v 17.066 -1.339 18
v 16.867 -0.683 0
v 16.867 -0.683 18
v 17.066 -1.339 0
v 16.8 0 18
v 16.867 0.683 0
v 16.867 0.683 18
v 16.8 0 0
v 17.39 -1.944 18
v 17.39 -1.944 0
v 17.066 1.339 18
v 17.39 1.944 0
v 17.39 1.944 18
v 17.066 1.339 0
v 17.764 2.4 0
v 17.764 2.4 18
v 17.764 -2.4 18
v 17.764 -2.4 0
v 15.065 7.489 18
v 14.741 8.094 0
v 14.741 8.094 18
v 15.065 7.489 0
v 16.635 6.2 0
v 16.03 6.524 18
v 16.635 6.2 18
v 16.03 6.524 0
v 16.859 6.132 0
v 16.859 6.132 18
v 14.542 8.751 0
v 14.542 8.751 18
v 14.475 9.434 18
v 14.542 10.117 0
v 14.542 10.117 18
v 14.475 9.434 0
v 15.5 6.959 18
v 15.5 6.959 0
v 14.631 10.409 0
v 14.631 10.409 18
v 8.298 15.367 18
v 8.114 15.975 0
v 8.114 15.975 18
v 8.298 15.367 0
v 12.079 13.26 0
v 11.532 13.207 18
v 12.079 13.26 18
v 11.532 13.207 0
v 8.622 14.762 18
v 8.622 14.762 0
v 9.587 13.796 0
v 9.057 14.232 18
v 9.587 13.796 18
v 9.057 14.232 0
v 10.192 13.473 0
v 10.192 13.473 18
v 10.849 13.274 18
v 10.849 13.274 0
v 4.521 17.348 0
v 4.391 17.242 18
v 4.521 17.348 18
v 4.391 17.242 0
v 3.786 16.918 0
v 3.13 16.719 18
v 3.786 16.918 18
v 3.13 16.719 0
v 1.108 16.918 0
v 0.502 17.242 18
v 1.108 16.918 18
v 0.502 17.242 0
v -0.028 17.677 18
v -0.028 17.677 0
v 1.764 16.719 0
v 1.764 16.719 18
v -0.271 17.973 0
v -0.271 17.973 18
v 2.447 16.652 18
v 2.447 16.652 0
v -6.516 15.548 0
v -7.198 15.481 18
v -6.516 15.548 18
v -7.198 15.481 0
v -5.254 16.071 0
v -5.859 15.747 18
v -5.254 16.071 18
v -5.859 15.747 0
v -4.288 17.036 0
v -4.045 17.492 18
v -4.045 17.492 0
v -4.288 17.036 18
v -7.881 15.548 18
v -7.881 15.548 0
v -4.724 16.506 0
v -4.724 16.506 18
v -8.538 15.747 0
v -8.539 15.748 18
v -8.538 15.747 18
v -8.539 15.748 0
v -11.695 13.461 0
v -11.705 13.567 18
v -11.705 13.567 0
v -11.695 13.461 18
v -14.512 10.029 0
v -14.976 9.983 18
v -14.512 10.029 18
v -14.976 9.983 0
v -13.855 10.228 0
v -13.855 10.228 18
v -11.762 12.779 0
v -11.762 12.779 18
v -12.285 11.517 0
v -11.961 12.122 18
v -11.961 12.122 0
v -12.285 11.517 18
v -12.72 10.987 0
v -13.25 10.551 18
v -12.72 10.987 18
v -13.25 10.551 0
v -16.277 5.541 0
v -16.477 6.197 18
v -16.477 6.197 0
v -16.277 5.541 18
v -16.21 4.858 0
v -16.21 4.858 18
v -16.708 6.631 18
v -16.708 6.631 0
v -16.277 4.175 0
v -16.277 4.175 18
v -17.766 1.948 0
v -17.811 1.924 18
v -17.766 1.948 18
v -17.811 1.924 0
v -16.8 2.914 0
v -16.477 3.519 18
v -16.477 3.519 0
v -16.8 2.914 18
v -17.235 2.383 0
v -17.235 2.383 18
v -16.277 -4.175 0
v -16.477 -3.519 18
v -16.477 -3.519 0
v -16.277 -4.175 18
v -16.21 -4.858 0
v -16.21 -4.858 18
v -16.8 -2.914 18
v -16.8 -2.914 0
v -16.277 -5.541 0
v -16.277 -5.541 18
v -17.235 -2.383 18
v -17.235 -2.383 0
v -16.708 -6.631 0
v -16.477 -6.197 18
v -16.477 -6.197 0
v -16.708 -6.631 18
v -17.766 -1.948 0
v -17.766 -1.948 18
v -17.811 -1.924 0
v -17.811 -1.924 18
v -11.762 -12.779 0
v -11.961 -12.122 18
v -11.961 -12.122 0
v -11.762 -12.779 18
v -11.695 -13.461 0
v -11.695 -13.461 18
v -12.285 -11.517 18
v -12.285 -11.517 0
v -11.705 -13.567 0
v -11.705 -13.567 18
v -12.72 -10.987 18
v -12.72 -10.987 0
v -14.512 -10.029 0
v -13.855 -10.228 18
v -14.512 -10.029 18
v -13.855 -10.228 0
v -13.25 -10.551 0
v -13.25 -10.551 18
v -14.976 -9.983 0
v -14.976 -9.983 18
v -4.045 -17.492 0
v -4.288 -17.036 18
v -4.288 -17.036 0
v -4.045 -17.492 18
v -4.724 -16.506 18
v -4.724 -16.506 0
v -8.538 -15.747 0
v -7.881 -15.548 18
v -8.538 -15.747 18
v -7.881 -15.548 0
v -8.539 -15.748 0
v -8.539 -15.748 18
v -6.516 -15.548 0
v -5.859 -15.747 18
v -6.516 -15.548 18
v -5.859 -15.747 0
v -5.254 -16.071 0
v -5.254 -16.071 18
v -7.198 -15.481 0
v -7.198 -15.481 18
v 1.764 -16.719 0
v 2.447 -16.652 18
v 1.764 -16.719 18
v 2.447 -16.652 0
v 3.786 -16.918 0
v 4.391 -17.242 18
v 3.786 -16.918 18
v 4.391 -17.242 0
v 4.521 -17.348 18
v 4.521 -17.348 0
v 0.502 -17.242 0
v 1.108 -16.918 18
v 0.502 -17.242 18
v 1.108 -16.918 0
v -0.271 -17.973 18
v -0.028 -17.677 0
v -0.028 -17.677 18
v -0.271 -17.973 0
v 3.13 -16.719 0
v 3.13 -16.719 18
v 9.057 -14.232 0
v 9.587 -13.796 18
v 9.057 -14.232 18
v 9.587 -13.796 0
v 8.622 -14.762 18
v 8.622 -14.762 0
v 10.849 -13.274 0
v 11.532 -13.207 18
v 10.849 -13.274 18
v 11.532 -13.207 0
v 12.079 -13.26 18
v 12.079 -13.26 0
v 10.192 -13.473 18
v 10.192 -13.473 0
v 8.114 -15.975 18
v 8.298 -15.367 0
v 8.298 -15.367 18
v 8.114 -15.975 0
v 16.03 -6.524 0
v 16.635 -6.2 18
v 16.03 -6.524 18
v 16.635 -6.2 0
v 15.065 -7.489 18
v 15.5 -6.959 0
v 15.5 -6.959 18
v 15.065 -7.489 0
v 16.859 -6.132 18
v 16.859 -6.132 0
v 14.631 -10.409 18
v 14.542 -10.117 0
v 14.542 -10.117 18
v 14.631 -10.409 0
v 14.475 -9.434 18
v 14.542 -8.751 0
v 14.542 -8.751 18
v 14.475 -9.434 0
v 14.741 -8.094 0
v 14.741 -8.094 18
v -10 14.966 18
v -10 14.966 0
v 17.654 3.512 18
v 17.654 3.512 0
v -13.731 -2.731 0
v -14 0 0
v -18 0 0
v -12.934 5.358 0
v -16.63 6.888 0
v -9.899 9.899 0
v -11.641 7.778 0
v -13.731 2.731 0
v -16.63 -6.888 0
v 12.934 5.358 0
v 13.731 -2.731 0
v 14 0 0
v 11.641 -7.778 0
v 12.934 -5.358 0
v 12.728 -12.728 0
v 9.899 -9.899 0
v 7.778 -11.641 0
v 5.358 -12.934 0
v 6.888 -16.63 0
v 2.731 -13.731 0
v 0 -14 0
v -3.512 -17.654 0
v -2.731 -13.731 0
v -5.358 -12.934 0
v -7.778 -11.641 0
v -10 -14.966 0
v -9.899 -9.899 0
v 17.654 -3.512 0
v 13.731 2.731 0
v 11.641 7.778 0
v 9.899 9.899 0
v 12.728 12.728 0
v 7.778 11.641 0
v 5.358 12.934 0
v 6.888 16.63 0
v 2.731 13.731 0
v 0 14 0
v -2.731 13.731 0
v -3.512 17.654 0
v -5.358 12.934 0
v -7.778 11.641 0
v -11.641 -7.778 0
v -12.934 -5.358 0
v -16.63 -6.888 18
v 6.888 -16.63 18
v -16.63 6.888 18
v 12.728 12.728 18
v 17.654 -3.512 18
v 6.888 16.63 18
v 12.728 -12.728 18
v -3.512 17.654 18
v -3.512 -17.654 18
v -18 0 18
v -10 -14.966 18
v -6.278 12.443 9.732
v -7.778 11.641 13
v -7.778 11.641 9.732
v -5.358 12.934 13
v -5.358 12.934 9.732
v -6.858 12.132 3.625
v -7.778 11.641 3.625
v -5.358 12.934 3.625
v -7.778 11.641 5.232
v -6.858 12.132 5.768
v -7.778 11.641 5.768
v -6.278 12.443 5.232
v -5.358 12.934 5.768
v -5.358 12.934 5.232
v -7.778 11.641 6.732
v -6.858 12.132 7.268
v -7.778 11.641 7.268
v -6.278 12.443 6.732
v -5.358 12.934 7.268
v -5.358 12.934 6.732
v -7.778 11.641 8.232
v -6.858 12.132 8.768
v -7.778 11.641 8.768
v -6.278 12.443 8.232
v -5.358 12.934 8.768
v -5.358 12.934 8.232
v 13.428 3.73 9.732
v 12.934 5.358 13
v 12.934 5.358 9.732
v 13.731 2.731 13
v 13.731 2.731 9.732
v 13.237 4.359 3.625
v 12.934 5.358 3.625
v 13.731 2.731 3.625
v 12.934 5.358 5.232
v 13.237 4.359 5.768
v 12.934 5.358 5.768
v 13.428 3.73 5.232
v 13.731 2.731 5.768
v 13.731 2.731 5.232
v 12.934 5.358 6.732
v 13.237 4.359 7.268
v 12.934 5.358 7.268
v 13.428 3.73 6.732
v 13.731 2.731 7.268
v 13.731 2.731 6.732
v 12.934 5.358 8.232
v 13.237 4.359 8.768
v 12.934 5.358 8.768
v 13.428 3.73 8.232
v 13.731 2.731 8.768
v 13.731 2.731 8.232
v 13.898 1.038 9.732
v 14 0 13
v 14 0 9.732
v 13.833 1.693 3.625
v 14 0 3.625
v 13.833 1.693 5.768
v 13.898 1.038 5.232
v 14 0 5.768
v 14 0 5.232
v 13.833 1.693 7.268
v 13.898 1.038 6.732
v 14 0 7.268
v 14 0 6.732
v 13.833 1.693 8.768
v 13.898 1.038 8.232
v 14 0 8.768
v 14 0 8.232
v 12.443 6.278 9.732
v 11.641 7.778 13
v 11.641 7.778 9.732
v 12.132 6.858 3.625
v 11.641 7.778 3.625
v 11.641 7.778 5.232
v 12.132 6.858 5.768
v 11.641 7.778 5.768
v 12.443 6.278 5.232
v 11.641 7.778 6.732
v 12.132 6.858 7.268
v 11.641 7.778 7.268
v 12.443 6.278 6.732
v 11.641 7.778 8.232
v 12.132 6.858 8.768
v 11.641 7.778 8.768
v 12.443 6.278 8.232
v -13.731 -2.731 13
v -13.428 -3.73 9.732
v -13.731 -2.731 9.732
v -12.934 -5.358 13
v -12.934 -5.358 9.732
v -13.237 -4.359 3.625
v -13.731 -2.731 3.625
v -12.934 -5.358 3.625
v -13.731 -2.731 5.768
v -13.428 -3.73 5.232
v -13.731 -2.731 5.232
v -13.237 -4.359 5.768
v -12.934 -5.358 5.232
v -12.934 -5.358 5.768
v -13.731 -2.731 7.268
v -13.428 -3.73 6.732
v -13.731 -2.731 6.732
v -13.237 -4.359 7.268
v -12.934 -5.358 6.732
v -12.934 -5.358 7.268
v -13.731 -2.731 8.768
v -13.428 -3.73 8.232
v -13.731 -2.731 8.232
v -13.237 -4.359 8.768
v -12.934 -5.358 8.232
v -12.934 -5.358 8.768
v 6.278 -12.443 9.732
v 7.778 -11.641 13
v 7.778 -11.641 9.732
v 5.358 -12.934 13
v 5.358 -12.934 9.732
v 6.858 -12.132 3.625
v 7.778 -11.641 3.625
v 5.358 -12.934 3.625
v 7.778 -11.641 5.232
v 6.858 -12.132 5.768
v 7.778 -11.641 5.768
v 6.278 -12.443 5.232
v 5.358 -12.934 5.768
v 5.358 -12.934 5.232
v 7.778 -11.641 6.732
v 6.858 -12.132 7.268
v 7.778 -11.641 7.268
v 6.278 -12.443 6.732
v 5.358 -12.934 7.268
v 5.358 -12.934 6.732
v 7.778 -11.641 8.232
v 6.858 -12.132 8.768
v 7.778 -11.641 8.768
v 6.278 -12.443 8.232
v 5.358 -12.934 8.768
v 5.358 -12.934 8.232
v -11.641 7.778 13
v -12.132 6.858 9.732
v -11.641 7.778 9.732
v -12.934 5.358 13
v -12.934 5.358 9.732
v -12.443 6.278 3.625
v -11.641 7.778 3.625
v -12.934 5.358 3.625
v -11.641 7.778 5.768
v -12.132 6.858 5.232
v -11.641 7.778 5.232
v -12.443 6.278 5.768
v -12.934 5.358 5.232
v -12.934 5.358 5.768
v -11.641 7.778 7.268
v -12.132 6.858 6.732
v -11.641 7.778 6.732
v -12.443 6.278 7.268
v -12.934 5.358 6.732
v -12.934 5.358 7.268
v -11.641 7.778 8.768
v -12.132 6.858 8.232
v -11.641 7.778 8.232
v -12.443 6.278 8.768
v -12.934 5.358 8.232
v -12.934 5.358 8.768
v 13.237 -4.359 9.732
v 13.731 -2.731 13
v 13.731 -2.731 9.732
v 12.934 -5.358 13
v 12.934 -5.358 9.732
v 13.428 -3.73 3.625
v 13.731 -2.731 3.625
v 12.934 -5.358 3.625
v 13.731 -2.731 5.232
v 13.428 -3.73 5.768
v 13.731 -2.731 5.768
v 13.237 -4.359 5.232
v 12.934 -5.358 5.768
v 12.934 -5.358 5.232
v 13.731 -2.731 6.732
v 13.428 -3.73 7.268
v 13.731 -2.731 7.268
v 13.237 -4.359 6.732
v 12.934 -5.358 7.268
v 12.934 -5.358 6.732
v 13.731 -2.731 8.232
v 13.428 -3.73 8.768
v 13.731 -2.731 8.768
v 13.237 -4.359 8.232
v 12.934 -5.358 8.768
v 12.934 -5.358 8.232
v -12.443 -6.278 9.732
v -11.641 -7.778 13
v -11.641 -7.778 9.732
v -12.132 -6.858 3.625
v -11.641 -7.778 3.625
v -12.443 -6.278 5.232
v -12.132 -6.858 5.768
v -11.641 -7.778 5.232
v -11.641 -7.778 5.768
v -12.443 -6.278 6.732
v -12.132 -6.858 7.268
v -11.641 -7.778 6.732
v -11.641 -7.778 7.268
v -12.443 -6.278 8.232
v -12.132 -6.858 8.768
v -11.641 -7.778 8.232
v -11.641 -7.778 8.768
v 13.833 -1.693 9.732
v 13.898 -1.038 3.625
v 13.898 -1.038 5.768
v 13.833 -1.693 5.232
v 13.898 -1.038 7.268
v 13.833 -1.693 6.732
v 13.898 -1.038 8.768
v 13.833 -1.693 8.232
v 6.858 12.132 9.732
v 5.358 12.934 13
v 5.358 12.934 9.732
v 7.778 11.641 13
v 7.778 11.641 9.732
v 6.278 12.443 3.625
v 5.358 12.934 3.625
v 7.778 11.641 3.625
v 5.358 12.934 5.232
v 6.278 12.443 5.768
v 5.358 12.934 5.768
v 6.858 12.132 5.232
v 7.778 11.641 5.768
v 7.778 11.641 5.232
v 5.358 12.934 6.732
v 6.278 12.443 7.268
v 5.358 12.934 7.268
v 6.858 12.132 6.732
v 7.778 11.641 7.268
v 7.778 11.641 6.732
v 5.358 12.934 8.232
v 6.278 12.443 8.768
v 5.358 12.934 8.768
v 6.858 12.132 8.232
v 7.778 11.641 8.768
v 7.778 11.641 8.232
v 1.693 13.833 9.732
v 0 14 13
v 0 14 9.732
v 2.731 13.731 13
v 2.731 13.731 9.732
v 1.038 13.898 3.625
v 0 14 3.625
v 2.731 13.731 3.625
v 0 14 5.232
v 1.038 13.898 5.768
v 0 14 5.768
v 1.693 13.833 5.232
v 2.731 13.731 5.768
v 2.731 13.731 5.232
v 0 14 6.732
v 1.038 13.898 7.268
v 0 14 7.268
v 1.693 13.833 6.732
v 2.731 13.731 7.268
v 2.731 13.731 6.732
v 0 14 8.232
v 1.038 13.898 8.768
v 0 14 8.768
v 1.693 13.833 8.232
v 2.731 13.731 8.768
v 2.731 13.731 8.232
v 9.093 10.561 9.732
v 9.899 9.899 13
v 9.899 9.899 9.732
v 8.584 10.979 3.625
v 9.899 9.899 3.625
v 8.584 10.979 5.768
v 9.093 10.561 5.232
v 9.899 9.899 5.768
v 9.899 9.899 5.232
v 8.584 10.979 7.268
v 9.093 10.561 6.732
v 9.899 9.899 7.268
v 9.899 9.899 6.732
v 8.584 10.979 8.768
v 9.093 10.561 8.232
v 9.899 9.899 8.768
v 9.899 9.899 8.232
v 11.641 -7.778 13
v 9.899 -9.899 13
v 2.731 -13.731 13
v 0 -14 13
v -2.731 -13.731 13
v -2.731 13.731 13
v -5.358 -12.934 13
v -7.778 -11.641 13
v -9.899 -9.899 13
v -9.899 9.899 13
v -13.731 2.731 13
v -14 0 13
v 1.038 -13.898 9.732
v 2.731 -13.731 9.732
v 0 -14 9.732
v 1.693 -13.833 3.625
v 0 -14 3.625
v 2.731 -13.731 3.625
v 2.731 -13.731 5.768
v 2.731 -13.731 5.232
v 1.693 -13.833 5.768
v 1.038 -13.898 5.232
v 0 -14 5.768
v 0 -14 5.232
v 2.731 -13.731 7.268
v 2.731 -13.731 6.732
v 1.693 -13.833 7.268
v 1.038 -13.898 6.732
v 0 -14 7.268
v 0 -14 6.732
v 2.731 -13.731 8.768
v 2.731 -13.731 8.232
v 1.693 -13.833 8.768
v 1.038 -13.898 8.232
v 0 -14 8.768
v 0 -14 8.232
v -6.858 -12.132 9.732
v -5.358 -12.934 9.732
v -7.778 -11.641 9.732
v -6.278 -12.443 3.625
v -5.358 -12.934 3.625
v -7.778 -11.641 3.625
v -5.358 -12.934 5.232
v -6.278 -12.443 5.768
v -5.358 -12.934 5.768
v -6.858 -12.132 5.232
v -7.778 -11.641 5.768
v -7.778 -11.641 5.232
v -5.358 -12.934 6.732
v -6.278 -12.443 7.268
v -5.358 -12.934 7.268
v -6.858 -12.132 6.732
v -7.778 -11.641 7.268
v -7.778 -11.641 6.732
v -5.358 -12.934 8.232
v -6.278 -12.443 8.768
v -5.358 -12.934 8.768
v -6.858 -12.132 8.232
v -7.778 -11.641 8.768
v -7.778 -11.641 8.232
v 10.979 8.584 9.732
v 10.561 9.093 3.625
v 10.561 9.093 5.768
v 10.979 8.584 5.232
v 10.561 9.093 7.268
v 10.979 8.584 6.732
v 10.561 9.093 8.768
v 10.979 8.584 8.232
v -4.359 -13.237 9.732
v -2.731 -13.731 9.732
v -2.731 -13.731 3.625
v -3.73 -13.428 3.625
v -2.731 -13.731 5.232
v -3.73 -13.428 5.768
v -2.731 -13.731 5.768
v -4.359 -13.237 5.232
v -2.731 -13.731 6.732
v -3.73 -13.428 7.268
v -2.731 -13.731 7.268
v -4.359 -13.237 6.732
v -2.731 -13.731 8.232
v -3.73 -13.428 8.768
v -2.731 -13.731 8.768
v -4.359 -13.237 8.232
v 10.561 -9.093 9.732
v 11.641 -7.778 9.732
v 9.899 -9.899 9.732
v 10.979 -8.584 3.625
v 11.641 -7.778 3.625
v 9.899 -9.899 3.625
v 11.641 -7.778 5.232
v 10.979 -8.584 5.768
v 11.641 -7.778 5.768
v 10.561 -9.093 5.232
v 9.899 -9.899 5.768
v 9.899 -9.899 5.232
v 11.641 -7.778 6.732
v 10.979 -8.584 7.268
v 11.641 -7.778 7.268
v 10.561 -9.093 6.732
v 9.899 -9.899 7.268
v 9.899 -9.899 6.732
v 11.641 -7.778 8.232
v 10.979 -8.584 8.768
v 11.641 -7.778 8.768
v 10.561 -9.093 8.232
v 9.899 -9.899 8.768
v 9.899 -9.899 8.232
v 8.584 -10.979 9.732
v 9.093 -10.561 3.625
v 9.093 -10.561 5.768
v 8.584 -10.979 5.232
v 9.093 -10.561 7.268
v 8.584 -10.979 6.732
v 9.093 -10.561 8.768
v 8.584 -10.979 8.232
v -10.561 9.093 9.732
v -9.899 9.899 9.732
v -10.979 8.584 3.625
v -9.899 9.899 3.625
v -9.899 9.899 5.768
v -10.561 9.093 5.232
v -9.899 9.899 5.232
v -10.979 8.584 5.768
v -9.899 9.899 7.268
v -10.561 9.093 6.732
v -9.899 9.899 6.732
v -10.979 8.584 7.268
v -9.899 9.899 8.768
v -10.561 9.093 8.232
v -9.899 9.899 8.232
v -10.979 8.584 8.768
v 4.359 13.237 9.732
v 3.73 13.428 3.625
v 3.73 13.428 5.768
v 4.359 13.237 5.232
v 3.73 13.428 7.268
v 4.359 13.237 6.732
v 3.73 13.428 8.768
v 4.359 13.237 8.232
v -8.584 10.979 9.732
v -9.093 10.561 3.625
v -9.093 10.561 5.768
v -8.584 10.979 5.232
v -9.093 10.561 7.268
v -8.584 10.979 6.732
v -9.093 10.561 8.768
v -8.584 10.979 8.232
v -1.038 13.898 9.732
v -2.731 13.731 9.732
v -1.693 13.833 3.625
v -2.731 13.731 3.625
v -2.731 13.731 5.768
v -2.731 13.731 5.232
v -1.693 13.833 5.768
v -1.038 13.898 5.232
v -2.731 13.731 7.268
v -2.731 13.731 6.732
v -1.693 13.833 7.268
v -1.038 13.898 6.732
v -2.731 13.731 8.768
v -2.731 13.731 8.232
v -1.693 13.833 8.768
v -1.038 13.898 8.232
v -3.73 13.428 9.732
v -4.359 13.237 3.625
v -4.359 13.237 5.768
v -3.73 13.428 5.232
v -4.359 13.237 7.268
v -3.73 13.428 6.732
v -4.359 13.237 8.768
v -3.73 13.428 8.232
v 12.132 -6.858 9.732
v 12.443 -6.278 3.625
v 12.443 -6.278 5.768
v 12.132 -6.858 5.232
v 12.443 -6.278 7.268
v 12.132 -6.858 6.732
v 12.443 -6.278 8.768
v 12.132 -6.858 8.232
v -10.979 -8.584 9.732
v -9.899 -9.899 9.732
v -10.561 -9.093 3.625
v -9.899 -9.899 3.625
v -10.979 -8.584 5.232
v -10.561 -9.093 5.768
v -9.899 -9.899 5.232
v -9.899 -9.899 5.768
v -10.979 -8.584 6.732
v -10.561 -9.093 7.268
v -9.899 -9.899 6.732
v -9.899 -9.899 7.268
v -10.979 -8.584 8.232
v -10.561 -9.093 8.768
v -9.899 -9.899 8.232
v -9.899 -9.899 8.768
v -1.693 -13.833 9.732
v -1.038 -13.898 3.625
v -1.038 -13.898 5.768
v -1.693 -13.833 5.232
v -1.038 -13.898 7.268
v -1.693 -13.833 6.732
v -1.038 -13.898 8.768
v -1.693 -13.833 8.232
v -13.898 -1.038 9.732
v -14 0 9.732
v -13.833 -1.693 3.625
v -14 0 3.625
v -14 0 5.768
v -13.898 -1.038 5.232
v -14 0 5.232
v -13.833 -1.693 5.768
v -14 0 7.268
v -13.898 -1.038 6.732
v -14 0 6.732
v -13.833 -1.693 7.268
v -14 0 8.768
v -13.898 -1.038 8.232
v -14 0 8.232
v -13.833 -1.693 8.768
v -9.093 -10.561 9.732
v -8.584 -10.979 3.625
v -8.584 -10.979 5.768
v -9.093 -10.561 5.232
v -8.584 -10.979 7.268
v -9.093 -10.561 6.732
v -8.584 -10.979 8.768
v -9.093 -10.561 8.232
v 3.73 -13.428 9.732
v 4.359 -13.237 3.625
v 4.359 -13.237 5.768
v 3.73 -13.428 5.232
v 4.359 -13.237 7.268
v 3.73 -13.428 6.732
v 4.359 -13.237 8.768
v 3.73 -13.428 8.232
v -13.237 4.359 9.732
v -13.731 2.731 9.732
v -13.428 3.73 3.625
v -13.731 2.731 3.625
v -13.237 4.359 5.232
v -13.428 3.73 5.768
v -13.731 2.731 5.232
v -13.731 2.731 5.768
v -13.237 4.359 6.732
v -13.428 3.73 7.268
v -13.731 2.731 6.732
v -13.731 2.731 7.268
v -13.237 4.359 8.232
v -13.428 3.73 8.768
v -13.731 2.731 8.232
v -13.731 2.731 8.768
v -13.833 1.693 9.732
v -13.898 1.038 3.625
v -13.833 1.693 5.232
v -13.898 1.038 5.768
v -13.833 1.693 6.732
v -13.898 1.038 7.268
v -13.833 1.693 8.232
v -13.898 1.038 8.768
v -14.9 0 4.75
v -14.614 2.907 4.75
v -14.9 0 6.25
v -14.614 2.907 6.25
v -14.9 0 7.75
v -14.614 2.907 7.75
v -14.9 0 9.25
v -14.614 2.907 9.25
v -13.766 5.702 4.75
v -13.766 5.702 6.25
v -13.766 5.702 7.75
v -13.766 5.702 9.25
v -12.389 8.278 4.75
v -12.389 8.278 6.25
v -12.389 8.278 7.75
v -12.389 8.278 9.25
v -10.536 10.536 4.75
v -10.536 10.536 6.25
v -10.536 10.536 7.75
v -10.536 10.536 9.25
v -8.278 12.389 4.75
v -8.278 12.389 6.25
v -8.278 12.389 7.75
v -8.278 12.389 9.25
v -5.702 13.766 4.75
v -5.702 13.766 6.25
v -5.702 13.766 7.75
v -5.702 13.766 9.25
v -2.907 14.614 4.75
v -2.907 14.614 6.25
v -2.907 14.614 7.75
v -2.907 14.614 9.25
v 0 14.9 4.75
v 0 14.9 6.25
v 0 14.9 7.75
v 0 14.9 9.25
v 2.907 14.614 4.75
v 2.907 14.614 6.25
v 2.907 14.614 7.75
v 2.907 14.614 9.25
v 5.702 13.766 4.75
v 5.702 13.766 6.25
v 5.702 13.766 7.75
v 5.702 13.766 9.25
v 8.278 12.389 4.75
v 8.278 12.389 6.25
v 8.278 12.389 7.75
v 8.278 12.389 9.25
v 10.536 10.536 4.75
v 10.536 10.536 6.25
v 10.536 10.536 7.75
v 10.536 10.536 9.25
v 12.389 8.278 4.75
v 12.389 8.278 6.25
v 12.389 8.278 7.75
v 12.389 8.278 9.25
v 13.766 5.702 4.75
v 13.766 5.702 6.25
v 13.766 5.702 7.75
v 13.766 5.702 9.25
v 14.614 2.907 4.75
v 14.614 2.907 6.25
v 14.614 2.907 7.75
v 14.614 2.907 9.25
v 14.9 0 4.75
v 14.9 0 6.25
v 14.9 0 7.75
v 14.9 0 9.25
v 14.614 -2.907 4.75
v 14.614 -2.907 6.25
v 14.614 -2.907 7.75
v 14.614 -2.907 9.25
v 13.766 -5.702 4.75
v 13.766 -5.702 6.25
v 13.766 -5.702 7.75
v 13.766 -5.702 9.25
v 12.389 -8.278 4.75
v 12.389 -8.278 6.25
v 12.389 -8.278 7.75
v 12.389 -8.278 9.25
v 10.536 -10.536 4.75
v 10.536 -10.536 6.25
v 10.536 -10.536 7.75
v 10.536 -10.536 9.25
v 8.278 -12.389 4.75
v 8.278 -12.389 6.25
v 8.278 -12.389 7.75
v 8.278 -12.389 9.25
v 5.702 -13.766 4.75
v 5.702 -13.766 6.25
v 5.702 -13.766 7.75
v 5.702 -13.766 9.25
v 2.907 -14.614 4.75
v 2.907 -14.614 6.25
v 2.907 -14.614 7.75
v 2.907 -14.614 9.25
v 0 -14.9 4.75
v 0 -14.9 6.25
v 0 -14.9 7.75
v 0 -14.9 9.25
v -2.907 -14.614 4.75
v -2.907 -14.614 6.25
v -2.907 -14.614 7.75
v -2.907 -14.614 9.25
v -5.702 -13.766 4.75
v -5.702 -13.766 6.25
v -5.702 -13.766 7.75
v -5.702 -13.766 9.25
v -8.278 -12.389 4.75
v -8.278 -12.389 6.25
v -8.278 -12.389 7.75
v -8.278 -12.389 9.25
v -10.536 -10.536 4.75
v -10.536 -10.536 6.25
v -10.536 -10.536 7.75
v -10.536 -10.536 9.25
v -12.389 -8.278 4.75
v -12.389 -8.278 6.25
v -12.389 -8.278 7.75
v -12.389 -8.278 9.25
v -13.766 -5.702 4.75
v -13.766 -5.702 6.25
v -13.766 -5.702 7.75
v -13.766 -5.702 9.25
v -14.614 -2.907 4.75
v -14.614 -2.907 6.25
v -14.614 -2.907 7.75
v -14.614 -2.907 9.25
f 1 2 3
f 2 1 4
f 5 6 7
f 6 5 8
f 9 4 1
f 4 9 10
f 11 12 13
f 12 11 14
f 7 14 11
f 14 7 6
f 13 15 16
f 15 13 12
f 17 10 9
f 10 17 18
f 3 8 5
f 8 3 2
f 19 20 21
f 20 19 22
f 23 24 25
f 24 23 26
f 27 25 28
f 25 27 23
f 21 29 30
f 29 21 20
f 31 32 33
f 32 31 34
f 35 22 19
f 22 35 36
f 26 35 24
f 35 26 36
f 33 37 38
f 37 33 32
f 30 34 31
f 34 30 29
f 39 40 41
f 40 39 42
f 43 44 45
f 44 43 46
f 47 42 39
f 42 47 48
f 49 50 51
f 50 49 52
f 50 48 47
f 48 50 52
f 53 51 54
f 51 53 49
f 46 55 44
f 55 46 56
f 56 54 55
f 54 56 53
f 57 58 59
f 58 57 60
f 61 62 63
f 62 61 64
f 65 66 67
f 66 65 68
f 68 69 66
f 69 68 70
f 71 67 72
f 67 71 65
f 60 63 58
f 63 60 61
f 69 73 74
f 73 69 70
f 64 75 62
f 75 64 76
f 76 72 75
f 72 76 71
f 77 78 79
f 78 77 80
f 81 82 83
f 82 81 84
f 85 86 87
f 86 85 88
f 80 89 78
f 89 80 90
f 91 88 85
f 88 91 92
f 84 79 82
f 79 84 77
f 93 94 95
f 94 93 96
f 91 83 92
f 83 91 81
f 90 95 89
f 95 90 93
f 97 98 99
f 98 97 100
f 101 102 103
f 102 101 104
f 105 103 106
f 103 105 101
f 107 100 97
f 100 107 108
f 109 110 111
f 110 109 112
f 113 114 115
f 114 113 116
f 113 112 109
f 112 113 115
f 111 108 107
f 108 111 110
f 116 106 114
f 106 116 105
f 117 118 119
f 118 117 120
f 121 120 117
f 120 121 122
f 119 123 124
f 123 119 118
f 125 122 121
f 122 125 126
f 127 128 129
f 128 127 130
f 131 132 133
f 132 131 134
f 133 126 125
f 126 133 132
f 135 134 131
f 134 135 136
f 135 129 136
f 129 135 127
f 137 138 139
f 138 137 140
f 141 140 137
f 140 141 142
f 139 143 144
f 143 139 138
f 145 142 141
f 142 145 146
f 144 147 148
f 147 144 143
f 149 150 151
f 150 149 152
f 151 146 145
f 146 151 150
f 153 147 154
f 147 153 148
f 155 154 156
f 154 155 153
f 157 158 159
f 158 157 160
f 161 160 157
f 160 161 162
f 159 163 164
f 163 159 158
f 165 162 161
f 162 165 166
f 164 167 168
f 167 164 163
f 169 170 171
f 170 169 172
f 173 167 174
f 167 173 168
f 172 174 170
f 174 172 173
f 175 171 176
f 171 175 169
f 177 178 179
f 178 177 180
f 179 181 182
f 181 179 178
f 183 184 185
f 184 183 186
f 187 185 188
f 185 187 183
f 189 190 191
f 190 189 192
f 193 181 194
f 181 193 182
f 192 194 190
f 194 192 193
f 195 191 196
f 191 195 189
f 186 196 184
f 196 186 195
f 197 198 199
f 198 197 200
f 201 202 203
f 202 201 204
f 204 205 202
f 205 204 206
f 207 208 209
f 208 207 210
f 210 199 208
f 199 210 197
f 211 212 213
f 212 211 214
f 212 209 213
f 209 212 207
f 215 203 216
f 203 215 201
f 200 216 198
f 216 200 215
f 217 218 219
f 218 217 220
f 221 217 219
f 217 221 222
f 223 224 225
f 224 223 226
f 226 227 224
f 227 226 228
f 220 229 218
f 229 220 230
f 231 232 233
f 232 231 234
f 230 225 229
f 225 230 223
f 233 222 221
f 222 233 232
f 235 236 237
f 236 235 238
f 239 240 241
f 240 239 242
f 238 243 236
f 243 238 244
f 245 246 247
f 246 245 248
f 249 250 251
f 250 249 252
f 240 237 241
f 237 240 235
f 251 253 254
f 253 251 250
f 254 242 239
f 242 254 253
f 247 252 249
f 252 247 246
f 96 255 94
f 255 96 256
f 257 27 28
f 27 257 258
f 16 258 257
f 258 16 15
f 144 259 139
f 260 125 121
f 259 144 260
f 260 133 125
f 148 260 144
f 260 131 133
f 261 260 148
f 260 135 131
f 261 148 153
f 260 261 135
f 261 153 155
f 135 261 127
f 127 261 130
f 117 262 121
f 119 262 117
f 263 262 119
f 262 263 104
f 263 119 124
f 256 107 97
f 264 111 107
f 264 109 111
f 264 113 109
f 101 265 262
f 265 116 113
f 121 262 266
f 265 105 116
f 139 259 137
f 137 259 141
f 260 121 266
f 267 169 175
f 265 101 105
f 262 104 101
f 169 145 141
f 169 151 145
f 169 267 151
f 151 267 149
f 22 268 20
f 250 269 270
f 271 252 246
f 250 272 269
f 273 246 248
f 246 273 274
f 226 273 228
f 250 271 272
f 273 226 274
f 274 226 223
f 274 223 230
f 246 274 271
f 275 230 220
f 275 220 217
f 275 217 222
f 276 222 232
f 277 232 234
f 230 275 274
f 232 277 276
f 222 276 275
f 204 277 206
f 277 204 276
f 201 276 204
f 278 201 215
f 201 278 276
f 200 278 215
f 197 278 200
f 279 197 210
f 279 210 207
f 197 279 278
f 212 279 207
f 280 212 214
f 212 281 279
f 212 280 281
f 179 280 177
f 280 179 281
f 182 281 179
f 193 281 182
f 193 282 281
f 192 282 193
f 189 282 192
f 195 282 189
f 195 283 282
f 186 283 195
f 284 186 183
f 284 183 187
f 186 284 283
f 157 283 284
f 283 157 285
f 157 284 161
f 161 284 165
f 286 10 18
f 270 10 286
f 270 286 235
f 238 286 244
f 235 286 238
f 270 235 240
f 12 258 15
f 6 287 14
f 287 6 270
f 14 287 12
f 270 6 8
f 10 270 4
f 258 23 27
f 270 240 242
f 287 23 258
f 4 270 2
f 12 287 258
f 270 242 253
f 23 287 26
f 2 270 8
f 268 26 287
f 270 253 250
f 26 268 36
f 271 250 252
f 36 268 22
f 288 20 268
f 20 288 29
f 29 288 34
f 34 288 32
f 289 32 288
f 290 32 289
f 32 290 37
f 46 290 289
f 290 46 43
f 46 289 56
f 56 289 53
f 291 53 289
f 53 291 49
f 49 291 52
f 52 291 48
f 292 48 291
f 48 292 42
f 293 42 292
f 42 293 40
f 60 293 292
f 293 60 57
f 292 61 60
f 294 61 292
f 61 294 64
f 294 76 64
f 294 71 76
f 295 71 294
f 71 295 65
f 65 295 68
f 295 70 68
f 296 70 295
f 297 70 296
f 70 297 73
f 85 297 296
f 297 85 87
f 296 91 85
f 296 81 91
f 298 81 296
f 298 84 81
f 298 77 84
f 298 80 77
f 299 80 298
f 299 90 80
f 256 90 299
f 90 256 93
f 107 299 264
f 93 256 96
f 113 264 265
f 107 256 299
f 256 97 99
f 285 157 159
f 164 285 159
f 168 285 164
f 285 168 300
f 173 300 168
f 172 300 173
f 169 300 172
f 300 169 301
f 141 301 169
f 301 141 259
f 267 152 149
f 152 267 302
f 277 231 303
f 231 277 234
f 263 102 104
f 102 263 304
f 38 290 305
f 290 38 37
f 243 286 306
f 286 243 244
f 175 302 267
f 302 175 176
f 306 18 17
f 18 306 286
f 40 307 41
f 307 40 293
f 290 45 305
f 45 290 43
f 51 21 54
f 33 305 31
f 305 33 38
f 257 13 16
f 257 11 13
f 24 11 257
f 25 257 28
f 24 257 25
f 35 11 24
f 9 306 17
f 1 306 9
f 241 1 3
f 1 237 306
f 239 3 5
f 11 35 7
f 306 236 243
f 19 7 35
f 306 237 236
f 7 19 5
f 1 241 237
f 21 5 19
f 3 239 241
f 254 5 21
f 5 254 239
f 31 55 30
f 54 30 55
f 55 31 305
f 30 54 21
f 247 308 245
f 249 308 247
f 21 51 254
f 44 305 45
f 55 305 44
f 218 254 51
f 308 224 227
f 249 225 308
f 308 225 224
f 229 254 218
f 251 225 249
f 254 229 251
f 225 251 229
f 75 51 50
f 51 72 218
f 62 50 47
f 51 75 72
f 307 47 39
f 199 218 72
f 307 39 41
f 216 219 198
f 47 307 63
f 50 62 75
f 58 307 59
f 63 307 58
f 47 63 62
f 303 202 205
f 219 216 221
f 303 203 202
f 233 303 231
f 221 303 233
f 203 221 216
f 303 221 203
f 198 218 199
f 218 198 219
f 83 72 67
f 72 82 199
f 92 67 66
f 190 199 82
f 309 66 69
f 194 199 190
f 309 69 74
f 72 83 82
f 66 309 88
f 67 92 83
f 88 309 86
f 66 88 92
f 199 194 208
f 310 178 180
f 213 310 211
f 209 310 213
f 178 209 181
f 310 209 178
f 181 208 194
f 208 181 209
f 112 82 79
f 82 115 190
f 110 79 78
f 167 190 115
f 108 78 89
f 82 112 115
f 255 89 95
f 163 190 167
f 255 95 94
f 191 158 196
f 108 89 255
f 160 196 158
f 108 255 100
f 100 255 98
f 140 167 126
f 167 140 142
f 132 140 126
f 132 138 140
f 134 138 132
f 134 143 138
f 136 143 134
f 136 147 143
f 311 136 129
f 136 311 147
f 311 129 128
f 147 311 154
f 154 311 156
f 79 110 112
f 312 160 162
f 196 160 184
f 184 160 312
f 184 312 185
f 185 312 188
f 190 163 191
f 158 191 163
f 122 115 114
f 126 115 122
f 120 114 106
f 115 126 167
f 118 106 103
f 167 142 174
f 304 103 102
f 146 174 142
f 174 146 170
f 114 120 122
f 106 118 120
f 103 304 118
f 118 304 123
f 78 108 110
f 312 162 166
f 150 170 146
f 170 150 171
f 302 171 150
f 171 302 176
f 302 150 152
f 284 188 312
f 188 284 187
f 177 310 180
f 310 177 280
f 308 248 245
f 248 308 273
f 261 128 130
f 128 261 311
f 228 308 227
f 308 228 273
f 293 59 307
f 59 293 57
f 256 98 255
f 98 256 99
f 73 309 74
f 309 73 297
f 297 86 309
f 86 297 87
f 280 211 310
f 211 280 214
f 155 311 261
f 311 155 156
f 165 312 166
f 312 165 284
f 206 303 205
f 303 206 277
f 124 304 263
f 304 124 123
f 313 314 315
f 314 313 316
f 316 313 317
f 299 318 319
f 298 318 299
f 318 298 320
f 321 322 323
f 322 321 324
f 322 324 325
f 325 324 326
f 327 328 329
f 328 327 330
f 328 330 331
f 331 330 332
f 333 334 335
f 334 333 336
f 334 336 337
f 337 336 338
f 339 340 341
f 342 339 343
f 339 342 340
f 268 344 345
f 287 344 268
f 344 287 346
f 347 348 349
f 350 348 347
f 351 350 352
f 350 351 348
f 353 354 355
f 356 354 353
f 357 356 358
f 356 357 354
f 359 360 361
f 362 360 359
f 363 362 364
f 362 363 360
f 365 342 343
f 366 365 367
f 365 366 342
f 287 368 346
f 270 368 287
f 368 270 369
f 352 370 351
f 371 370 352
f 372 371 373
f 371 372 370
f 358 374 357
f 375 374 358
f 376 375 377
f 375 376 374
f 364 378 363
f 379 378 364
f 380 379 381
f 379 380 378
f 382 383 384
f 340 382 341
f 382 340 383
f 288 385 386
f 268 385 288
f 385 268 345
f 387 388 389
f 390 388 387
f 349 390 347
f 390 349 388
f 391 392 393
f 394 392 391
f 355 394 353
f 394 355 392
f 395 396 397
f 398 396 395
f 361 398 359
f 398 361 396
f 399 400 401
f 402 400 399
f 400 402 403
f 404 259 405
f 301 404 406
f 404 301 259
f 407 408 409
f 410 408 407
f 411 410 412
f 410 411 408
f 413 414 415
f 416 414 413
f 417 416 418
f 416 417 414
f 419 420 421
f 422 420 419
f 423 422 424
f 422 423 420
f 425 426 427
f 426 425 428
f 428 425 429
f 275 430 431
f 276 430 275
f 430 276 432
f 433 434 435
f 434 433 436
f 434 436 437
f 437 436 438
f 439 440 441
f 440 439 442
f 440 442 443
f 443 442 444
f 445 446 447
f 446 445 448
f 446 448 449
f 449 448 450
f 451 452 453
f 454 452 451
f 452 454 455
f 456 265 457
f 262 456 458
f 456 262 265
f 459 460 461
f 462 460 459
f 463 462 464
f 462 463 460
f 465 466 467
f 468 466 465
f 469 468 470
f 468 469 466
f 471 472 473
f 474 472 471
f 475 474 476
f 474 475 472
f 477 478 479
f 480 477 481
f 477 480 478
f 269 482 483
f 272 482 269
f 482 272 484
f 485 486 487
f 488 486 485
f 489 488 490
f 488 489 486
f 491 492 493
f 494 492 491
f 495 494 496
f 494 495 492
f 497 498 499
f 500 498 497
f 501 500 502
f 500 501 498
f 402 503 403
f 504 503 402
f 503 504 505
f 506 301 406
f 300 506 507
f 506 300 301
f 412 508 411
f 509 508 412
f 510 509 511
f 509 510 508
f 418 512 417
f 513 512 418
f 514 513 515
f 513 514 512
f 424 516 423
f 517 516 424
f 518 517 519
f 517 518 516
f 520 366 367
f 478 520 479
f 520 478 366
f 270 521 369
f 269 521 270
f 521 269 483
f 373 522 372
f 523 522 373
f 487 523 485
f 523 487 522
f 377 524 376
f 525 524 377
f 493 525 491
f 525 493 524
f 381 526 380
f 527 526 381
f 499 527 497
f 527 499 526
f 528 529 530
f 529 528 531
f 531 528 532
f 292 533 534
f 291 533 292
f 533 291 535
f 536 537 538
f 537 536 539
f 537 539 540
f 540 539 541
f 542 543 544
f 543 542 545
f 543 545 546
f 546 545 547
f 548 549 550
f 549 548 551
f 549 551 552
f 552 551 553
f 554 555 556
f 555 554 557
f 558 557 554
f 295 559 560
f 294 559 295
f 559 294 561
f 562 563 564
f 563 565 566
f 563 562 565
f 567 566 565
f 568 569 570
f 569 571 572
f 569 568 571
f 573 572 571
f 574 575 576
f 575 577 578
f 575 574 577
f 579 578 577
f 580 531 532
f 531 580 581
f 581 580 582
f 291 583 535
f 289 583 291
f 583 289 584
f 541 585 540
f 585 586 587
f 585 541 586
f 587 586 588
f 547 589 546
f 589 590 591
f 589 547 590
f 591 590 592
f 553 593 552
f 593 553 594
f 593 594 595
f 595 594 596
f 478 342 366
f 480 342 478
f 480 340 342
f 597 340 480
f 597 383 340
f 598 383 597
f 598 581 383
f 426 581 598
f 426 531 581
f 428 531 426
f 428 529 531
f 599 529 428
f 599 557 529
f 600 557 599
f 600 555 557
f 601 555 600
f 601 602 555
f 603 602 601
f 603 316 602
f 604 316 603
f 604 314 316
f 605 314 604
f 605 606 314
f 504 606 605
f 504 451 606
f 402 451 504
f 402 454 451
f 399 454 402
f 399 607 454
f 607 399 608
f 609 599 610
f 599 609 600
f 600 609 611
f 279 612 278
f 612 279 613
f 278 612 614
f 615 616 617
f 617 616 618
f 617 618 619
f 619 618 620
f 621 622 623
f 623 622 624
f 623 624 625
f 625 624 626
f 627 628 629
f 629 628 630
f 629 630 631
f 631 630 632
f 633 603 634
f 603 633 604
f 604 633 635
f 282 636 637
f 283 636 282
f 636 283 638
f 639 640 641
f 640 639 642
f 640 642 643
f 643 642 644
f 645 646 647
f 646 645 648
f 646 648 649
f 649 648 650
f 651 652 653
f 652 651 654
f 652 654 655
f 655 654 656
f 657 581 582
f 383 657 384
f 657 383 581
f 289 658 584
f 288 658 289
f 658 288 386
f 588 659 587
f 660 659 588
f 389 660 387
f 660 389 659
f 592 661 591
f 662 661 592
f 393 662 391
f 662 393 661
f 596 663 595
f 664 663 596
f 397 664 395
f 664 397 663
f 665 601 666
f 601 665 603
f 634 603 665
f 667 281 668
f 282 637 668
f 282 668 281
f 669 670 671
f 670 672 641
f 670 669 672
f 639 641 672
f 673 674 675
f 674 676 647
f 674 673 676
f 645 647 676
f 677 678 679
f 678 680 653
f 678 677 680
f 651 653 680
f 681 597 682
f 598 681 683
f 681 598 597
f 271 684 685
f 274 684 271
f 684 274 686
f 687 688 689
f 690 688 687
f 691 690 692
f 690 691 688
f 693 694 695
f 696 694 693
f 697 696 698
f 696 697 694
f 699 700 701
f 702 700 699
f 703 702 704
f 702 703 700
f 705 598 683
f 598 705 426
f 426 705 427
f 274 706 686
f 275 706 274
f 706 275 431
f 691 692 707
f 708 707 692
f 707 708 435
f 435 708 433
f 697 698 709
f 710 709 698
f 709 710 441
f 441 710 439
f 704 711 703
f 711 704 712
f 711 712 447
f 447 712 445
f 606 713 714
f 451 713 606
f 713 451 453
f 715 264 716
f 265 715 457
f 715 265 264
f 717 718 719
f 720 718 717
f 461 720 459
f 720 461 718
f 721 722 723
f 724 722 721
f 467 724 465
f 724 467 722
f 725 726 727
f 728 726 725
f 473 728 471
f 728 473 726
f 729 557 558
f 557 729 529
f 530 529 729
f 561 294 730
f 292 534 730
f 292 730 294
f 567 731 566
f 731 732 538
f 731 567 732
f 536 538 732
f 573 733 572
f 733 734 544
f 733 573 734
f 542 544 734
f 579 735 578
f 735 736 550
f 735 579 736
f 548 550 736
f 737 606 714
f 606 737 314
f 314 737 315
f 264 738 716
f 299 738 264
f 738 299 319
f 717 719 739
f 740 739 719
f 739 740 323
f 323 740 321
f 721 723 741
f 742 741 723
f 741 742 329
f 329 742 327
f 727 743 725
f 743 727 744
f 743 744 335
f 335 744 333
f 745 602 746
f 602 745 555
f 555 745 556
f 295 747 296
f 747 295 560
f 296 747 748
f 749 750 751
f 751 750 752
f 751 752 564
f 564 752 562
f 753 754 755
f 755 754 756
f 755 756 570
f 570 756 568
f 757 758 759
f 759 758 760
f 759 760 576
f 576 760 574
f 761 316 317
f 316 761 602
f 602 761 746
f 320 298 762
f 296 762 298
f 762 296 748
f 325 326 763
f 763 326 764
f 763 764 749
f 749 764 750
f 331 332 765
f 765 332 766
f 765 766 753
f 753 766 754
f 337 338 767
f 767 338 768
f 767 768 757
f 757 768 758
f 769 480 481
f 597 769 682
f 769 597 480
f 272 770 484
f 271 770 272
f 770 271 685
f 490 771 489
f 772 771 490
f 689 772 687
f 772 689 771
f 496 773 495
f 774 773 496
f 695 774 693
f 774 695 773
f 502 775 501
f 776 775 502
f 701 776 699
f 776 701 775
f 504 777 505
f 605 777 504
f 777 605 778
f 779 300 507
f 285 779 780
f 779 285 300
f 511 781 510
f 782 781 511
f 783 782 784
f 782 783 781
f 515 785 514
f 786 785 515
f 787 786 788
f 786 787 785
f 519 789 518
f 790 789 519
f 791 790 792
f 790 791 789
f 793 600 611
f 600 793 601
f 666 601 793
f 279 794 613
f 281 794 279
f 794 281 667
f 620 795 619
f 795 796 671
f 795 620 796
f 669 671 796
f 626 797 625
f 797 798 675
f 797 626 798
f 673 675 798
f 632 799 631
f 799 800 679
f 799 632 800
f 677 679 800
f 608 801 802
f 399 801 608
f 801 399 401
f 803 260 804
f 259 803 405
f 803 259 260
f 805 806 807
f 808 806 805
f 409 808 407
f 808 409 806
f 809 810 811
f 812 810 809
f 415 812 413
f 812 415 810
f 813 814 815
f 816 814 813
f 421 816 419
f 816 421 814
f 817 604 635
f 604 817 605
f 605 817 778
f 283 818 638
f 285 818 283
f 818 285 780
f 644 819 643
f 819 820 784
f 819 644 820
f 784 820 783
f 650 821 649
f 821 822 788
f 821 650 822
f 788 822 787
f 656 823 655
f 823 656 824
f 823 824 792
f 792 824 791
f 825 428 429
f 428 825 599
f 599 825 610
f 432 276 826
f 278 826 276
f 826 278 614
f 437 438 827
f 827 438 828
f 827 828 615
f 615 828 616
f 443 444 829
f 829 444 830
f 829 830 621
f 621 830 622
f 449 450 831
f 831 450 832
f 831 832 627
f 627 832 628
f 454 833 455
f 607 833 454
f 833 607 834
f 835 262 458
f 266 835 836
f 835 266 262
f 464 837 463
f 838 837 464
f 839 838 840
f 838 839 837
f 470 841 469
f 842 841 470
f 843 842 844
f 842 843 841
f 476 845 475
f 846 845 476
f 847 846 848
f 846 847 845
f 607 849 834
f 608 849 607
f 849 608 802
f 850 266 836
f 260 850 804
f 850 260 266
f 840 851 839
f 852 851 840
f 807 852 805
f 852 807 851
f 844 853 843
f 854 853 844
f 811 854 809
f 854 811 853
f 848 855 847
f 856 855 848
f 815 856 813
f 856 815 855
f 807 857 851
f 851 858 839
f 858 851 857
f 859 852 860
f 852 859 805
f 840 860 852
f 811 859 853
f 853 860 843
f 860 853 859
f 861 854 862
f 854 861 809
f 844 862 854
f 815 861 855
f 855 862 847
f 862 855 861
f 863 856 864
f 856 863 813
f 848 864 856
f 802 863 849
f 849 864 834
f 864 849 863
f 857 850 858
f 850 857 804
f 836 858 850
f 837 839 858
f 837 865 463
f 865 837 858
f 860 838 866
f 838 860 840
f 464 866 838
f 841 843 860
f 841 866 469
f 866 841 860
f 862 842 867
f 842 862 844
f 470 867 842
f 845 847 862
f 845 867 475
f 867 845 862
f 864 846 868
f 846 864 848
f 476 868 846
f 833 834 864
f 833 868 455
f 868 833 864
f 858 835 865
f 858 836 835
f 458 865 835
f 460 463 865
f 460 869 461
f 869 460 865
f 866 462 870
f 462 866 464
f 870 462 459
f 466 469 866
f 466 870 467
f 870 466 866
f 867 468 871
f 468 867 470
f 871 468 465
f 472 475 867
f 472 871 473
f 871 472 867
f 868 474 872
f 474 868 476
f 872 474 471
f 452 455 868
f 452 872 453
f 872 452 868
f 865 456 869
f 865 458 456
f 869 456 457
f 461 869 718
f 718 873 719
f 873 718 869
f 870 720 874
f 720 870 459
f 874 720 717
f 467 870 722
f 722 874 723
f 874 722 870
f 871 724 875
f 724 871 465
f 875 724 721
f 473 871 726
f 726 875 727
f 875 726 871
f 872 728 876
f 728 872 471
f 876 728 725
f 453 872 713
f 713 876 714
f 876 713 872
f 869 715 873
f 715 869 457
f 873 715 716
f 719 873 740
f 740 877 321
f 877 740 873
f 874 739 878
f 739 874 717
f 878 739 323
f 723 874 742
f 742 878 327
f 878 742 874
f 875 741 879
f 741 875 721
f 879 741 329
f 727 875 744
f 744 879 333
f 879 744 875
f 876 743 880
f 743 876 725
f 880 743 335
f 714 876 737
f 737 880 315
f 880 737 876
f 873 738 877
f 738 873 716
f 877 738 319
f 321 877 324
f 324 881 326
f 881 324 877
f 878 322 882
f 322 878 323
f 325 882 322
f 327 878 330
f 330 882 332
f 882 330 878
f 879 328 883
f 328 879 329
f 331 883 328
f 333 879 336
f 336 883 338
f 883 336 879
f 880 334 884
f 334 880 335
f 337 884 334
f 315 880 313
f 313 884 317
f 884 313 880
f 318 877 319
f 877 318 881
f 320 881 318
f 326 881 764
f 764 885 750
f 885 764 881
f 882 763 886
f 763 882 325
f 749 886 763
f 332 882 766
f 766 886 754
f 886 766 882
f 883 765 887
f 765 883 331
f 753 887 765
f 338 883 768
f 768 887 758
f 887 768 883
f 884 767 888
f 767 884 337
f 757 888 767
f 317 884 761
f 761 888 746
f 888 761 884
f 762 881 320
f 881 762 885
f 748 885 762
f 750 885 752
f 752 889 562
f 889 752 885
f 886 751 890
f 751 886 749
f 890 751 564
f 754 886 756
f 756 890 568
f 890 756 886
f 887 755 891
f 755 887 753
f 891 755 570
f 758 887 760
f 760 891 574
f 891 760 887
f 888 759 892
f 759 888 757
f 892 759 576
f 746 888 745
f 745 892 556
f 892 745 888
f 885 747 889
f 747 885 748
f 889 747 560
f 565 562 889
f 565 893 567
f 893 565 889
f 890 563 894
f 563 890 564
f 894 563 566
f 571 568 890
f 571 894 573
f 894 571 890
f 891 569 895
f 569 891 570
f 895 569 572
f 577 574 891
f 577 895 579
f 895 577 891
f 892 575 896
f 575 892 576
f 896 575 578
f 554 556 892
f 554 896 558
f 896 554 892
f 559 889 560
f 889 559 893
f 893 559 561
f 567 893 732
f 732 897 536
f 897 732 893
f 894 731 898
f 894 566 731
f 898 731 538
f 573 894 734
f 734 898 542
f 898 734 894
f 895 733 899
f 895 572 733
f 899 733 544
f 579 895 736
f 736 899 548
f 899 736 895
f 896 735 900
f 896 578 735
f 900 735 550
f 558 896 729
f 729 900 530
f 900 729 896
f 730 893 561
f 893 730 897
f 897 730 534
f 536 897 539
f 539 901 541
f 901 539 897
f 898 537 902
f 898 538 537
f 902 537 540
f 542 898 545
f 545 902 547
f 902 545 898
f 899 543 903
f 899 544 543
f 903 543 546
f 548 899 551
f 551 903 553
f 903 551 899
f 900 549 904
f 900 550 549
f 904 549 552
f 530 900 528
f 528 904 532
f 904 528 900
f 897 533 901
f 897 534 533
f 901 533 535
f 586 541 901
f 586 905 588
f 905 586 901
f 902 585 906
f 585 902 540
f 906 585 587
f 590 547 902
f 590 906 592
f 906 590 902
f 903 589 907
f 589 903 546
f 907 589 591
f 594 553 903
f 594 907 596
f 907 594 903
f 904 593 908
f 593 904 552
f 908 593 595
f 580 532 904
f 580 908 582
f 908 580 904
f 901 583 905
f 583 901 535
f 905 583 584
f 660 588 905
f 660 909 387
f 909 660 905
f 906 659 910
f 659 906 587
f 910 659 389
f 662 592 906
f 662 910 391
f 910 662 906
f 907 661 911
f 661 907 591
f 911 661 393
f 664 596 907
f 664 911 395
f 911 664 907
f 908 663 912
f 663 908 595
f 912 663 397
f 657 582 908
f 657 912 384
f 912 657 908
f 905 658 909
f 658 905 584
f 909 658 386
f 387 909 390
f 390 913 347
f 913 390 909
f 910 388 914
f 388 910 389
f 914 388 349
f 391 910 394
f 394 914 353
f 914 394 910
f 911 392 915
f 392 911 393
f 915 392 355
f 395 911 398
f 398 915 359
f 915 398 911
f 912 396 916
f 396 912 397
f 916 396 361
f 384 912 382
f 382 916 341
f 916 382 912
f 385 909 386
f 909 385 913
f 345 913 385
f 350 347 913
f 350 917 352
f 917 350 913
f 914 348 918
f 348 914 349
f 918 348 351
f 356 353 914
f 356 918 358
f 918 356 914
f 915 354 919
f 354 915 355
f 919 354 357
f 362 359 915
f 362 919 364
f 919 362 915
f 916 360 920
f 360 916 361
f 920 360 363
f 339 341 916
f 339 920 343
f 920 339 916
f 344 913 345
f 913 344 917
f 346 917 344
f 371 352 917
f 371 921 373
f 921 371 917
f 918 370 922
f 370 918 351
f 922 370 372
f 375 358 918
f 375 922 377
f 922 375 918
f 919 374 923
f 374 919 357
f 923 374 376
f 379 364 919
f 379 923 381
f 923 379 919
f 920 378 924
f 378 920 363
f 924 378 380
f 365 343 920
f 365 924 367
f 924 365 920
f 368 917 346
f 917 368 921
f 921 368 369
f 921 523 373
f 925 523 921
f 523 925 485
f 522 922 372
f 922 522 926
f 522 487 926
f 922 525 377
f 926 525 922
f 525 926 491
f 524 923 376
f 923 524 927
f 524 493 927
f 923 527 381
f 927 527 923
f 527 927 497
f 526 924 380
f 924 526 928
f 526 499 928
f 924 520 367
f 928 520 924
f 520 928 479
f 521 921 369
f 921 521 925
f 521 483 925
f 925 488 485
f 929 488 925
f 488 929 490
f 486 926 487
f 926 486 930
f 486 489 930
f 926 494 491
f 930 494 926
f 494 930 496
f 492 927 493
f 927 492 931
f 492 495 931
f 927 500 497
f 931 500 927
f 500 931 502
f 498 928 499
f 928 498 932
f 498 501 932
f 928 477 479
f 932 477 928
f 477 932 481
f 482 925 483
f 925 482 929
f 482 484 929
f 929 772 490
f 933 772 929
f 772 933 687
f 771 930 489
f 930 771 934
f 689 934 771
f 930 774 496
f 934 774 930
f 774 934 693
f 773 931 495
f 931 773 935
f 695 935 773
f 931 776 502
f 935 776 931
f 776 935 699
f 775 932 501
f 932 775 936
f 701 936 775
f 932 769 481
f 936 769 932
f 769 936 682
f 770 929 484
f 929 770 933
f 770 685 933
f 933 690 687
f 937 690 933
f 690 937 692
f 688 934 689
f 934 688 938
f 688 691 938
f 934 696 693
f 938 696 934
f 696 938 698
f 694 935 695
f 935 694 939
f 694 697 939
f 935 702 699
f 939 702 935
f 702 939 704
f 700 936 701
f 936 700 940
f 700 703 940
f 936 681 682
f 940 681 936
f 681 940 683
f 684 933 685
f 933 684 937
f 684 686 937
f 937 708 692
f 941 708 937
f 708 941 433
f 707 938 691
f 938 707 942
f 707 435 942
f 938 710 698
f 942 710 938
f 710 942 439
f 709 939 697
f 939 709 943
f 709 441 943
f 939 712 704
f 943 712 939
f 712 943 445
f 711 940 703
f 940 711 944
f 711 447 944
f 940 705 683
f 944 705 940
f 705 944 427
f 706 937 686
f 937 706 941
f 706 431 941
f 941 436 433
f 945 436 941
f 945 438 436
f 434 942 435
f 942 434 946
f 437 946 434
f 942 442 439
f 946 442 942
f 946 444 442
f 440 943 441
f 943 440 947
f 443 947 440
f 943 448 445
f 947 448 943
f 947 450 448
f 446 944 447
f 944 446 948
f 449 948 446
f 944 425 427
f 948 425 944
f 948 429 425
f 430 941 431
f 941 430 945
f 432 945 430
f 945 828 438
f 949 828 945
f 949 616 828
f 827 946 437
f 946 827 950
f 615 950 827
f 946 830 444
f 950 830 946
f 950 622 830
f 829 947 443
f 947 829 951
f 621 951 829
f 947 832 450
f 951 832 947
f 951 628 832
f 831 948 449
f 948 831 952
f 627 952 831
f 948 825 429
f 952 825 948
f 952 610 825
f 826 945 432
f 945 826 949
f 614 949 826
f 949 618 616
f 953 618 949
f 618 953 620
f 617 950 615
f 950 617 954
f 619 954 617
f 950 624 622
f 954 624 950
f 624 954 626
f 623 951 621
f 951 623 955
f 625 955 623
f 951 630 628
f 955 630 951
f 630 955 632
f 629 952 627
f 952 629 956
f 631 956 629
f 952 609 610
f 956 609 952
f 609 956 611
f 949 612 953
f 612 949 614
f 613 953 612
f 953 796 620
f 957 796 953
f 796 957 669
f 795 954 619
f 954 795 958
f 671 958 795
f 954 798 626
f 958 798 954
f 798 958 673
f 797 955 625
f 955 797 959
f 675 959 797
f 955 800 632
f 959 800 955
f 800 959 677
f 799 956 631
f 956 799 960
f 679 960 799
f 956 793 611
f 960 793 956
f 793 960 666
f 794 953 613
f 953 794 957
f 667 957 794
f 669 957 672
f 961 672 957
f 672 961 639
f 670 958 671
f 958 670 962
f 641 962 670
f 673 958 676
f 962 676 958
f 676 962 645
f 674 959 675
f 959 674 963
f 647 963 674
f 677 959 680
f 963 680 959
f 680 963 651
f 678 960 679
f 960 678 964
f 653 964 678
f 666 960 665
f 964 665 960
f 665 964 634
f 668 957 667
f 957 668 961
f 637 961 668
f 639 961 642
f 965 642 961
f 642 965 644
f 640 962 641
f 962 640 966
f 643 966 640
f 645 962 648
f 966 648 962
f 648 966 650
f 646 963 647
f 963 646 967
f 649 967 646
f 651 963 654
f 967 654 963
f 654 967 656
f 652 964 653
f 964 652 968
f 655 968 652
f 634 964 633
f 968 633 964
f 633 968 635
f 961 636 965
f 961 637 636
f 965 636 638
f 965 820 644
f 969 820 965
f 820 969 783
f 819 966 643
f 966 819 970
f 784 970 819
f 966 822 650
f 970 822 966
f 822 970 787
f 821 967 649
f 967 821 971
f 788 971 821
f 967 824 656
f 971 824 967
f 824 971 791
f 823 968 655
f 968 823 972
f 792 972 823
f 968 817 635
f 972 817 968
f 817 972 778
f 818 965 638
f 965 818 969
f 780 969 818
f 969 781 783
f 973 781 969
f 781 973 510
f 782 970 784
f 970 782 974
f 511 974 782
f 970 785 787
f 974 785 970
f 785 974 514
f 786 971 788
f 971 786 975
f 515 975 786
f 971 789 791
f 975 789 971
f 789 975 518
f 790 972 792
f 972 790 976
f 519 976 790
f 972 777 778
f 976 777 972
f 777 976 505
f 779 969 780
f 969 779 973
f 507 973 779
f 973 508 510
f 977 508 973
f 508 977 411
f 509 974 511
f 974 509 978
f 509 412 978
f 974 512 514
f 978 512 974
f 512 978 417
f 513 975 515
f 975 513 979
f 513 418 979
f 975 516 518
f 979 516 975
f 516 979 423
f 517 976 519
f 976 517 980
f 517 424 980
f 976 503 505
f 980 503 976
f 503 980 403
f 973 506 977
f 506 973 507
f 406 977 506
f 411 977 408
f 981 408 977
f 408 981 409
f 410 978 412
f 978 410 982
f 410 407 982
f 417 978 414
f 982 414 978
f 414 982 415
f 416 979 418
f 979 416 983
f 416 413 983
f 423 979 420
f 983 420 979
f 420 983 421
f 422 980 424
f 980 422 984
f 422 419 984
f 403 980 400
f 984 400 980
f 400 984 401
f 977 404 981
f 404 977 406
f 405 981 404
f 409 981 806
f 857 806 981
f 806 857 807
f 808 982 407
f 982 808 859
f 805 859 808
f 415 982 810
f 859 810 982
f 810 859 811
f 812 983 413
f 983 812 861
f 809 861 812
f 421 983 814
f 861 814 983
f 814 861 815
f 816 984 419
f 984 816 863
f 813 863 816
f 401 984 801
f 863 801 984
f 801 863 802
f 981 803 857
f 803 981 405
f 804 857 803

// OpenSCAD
$fn = 32;

// ----------------------------------------------------------------------
// Threaded cap: 36 mm body, 18 mm tall, 28 mm threaded bore
// ----------------------------------------------------------------------

// --- parameters (mm) ---
outer_d = 36;             // cap outside diameter
body_h = 18;              // cap height
top_t = 5;                // closed top thickness
bore_d = 28;              // bore core diameter
pitch = 1.5;              // thread pitch
thread_d = 0.9;           // thread depth
thread_z = 3;             // thread start above the rim
thread_h = 7;             // threaded height
flutes = 13;              // number of knurl flutes
flute_d = 7;              // flute cutter diameter
flute_depth = 1.2;        // flute depth into the rim

difference() {
  union() {
    cylinder(h = 18, d = outer_d);
  }
  /* threaded bore, closed at the top */
  translate([0, 0, -2.5]) cylinder(h = 15.5, d = bore_d);
  translate([0, 0, 3]) rotate_extrude() polygon([[13, 0], [13, 7], [13.5, 7], [14.9, 6.25], [13.5, 5.5], [14.9, 4.75], [13.5, 4], [14.9, 3.25], [13.5, 2.5], [14.9, 1.75], [13.5, 0], [13, 0]]);
  /* knurl flutes around the rim */
  for (i = [0 : flutes - 1]) {
    a = i * 360 / flutes;
    translate([(outer_d / 2 + flute_d / 2 - flute_depth) * cos(a), (outer_d / 2 + flute_d / 2 - flute_depth) * sin(a), -2.5]) cylinder(h = body_h + 5, d = flute_d);
  }
}
